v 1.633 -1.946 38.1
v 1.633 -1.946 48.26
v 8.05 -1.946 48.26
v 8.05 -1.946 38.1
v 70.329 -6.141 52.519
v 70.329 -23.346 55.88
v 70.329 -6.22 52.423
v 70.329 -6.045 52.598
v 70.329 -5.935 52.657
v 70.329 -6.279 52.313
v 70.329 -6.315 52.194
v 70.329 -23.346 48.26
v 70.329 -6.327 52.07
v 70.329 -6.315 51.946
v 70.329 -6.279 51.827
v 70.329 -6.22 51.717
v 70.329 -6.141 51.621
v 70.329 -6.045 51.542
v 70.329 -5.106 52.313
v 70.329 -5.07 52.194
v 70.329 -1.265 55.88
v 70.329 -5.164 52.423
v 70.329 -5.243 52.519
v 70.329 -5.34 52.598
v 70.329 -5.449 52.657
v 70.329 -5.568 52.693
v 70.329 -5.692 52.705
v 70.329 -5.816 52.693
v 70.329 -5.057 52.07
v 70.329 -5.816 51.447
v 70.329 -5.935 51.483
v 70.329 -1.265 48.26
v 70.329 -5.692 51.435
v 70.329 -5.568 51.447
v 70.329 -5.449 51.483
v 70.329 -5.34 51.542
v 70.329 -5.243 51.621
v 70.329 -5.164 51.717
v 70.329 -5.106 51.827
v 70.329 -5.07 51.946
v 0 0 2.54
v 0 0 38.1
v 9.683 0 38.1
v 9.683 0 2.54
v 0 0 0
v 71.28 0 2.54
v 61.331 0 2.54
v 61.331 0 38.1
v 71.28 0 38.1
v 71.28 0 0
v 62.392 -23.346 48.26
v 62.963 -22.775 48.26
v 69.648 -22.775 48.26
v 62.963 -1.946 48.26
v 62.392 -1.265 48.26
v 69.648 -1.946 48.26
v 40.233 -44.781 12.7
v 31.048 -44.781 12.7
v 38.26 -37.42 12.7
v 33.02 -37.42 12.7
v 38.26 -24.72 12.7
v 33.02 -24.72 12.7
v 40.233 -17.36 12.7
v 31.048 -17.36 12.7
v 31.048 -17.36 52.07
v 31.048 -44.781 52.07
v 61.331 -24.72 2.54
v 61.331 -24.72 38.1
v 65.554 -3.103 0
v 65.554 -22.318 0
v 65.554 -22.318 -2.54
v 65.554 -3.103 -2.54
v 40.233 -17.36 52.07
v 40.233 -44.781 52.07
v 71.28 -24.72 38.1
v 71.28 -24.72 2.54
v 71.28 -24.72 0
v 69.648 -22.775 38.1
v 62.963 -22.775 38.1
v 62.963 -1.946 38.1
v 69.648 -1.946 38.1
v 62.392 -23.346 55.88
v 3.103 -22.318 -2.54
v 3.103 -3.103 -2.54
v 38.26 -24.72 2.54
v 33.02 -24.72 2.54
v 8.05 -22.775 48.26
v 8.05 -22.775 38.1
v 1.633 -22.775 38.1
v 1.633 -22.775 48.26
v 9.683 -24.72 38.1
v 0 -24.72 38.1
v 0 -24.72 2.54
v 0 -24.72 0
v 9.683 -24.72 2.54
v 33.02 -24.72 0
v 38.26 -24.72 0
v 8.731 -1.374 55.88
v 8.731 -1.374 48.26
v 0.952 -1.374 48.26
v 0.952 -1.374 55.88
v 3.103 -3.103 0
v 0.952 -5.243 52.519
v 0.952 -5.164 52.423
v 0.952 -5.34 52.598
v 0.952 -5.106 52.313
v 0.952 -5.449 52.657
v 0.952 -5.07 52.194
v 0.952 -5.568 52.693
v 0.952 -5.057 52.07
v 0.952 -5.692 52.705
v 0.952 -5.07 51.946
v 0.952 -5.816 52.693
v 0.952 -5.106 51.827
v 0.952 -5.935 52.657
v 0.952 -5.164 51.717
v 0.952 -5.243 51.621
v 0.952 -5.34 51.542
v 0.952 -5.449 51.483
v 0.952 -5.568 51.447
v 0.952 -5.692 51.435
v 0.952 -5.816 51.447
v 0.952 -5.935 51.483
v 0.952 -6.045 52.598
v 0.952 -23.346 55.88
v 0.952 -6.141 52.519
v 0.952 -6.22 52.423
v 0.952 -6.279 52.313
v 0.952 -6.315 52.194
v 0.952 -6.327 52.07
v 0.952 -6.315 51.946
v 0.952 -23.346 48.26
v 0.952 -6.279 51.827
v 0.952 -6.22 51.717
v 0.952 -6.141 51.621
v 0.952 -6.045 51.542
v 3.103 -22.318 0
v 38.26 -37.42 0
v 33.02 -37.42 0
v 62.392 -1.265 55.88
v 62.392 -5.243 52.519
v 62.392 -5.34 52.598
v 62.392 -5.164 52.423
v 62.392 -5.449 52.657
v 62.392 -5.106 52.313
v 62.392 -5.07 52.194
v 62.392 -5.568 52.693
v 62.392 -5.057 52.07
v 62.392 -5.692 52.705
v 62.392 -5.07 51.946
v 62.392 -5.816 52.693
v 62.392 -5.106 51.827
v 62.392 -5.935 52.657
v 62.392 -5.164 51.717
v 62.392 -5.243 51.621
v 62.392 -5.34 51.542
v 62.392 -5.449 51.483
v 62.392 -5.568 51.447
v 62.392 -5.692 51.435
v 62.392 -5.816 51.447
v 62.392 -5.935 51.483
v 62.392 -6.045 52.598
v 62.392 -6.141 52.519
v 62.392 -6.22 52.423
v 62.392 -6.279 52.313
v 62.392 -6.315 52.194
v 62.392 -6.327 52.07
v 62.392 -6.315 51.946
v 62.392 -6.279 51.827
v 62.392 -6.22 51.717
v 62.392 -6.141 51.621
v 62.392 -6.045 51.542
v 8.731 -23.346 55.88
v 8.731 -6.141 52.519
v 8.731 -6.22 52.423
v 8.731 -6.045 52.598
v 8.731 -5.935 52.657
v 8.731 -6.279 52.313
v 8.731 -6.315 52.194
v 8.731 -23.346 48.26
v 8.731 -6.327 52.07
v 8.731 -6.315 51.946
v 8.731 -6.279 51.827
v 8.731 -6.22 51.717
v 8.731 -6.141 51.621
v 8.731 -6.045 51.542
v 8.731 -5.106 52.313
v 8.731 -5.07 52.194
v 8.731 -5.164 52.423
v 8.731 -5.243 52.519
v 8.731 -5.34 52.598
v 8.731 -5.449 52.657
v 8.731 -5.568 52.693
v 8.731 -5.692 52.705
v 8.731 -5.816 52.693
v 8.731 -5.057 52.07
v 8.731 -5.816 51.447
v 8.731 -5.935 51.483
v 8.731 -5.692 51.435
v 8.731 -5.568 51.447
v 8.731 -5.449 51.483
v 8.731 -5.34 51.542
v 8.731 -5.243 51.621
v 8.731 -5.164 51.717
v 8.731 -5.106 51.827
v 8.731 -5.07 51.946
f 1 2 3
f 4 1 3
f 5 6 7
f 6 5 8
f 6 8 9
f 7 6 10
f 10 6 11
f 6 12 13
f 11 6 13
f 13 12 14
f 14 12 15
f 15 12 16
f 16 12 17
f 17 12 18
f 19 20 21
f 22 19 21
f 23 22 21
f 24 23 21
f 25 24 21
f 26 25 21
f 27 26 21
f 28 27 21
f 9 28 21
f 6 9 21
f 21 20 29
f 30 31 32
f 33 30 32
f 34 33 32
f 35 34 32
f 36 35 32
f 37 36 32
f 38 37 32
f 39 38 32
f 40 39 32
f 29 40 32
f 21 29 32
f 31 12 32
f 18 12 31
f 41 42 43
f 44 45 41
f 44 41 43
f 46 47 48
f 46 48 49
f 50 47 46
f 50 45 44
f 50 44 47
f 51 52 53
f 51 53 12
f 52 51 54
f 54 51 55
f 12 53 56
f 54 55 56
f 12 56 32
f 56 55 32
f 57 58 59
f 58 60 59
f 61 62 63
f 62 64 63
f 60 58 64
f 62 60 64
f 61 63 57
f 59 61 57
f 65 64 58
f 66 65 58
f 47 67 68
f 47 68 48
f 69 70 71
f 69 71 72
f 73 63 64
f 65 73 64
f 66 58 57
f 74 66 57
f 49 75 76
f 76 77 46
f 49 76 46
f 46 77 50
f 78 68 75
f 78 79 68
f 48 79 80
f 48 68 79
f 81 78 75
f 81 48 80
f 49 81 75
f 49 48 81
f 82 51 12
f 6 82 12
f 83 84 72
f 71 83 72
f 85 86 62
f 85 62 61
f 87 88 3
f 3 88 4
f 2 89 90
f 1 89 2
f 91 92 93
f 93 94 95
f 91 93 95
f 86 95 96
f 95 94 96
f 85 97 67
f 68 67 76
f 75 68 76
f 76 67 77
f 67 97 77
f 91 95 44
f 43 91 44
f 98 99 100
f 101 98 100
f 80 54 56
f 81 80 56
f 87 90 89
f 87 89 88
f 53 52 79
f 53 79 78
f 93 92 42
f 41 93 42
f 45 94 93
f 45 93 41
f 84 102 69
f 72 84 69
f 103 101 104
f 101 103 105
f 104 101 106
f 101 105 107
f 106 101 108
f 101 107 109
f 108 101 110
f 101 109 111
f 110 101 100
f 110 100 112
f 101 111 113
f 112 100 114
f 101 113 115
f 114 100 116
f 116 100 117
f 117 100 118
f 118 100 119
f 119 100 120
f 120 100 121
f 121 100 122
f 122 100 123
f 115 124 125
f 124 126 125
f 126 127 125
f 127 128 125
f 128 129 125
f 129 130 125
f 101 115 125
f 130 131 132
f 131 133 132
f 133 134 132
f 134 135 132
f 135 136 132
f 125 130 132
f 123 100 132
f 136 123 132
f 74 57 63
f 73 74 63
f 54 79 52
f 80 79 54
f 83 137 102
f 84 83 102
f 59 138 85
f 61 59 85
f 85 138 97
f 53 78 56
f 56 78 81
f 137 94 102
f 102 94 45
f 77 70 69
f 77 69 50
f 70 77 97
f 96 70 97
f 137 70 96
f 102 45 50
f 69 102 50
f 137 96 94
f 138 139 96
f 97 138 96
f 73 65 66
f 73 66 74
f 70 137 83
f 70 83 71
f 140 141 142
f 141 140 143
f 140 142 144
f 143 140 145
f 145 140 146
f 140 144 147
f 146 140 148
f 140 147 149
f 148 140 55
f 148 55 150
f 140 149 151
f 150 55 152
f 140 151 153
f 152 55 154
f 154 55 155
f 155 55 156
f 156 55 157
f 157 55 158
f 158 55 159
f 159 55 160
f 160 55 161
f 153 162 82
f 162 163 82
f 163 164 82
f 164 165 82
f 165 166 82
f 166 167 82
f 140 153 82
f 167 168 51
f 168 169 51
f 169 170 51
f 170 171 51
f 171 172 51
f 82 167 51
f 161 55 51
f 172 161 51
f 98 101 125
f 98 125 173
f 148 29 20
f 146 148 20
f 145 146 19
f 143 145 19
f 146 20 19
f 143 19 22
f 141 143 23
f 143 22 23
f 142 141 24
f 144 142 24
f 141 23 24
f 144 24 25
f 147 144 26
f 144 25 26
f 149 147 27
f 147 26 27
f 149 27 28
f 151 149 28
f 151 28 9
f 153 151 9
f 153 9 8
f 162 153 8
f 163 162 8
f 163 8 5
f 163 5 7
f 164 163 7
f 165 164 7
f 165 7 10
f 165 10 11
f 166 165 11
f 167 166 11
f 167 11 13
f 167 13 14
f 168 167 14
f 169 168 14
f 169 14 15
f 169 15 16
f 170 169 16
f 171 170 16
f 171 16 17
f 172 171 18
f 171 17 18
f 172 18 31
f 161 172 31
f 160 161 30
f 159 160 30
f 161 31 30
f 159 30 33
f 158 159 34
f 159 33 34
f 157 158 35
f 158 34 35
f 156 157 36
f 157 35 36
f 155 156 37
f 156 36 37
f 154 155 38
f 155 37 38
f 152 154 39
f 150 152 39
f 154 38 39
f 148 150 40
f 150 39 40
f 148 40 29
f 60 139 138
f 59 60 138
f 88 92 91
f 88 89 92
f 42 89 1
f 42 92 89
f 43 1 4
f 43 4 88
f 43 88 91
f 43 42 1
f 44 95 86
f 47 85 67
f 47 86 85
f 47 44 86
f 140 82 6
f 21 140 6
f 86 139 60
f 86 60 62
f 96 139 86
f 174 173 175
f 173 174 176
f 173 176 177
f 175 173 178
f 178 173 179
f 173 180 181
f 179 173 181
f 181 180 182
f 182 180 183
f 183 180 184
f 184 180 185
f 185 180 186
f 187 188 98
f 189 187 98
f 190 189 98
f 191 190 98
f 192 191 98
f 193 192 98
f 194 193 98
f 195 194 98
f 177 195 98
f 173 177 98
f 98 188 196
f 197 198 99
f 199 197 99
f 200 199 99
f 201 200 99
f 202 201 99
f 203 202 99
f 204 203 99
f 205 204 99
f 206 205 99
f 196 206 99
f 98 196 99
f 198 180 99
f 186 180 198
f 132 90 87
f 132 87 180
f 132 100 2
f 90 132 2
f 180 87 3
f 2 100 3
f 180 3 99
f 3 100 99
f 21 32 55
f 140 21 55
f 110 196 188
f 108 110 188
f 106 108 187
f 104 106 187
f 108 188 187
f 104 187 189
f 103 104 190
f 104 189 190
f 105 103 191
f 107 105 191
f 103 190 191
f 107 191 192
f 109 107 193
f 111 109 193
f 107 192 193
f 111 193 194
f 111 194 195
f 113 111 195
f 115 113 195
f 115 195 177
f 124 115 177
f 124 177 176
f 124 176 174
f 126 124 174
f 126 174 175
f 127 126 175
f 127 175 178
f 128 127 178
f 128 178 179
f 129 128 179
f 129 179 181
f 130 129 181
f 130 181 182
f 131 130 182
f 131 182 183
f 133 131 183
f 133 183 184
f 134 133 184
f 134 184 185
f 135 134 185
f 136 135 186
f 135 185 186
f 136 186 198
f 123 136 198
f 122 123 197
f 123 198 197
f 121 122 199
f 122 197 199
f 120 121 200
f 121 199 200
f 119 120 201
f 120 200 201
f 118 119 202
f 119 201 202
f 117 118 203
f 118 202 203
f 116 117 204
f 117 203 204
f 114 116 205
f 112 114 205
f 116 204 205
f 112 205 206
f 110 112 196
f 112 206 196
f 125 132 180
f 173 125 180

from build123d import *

# Parameters (mm, degrees)
F0_W      = 62.4516925456
F0_H      = 19.2159049461
F1_DEPTH  = 2.54
F0_W_2    = 5.240462238
F0_H_2    = 12.7
F1_FACE_W = 62.4516925456
F1_FACE_H = 19.2159049461
F2_DEPTH  = 2.54
F3_DEPTH  = 2.54
F4_DEPTH  = 12.7
F5_W      = 9.6827298403
F5_H      = 24.7204606325
F5_W_2    = 9.949860665
F6_DEPTH  = 35.56
F7_W      = 6.4173687831
F7_H      = 20.8289548615
F8_DEPTH  = 10.16
F9_W      = 6.6844996078
F9_H      = 20.8289548615
F10_DEPTH = 10.16
F11_W     = 6.4173687831
F11_H     = 20.8289548615
F12_DEPTH = 7.62
F13_W     = 6.6844996078
F13_H     = 20.8289548615
F14_DEPTH = 7.62
F16_D     = 1.27
F16_DEPTH = 127
F16_TIP   = 0.3815464931
F17_W     = 5.240462238
F17_H     = 12.7
F18_DEPTH = 39.37


with BuildPart() as f1:
    # F0 (on Top) → F1 (new body)
    with BuildSketch(Plane.XY):
        with Locations((34.3284141645, -12.7105206001)):
            Rectangle(F0_W, F0_H)
    extrude(amount=F1_DEPTH)

    # F0 (on Top) + F1_face (on face) → F2 (join)
    with BuildSketch(Plane.XY):
        Polygon((71.280462238, 0), (0, 0), (0, -24.7204606325), (33.02, -24.7204606325), (38.260462238, -24.7204606325), (71.280462238, -24.7204606325), align=None)
        with Locations((34.3284141645, -12.7105206001)):
            Rectangle(F0_W, F0_H, mode=Mode.SUBTRACT)
        with Locations((35.640231119, -31.0704606325)):
            Rectangle(F0_W_2, F0_H_2)
    with BuildSketch(Plane(origin=(34.3284141645, -12.7105206001, 0), x_dir=(1, 0, 0), z_dir=(0, 0, -1))):
        Rectangle(F1_FACE_W, F1_FACE_H)
    extrude(amount=F2_DEPTH, dir=(0, 0, 1))

    # F0 (on Top) → F3 (join)
    with BuildSketch(Plane.XY):
        with Locations((34.3284141645, -12.7105206001)):
            Rectangle(F0_W, F0_H)
    extrude(amount=-F3_DEPTH)

    # F0 (on Top) → F4 (join)
    with BuildSketch(Plane.XY):
        with Locations((35.640231119, -31.0704606325)):
            Rectangle(F0_W_2, F0_H_2)
    extrude(amount=F4_DEPTH)

    # F5 (on face) → F6 (join)
    with BuildSketch(Plane.XY.offset(2.54)):
        with Locations((4.8413649201, -12.3602303163)):
            Rectangle(F5_W, F5_H)
        with Locations((66.3055319055, -12.3602303163)):
            Rectangle(F5_W_2, F5_H)
    extrude(amount=F6_DEPTH)

    # F7 (on face) → F8 (join)
    with BuildSketch(Plane.XY.offset(38.1)):
        with Locations((4.8413649201, -12.3602303163)):
            Rectangle(F7_W, F7_H)
    extrude(amount=F8_DEPTH)

    # F9 (on face) → F10 (join)
    with BuildSketch(Plane.XY.offset(38.1)):
        with Locations((66.3055319055, -12.3602303163)):
            Rectangle(F9_W, F9_H)
    extrude(amount=F10_DEPTH)

    # F11 (on face) → F12 (join)
    with BuildSketch(Plane.XY.offset(48.26)):
        Polygon((8.7310628216, -1.3743147005), (0.9516670187, -1.3743147005), (1.6326805286, -1.9457528855), (8.0500493117, -1.9457528855), (8.0500493117, -22.774707747), (8.7310628216, -23.346145932), align=None)
        Polygon((1.6326805286, -1.9457528855), (0.9516670187, -1.3743147005), (0.9516670187, -23.346145932), (8.7310628216, -23.346145932), (8.0500493117, -22.774707747), (1.6326805286, -22.774707747), align=None)
        with Locations((4.8413649201, -12.3602303163)):
            Rectangle(F11_W, F11_H)
    extrude(amount=F12_DEPTH)

    # F13 (on face) → F14 (join)
    with BuildSketch(Plane.XY.offset(48.26)):
        Polygon((70.3287952193, -1.2647393756), (62.3918439166, -1.2647393756), (62.9632821016, -1.9457528855), (69.6477817094, -1.9457528855), (69.6477817094, -22.774707747), (70.3287952193, -23.346145932), align=None)
        Polygon((62.9632821016, -1.9457528855), (62.3918439166, -1.2647393756), (62.3918439166, -23.346145932), (70.3287952193, -23.346145932), (69.6477817094, -22.774707747), (62.9632821016, -22.774707747), align=None)
        with Locations((66.3055319055, -12.3602303163)):
            Rectangle(F13_W, F13_H)
    extrude(amount=F14_DEPTH)

    # F16
    with Locations(Plane(origin=(0.9516670187, 0, 0), x_dir=(0, -1, 0), z_dir=(-1, 0, 0))):
        with Locations((5.6923147005, 52.07)):
            Hole(F16_D / 2, depth=F16_DEPTH)
            with Locations((0, 0, -(F16_DEPTH + F16_TIP / 2))):  # 118° drill point
                Cone(0, F16_D / 2, F16_TIP, mode=Mode.SUBTRACT)

    # F17 (on face) → F18 (join)
    with BuildSketch(Plane.XY.offset(12.7)):
        Polygon((40.2326633617, -17.3601058362), (31.0477988763, -17.3601058362), (33.02, -24.7204606325), (38.260462238, -24.7204606325), (38.260462238, -37.4204606325), (40.2326633617, -44.7808154288), align=None)
        Polygon((33.02, -24.7204606325), (31.0477988763, -17.3601058362), (31.0477988763, -44.7808154288), (40.2326633617, -44.7808154288), (38.260462238, -37.4204606325), (33.02, -37.4204606325), align=None)
        with Locations((35.640231119, -31.0704606325)):
            Rectangle(F17_W, F17_H)
    extrude(amount=F18_DEPTH)


solid = f1.part
